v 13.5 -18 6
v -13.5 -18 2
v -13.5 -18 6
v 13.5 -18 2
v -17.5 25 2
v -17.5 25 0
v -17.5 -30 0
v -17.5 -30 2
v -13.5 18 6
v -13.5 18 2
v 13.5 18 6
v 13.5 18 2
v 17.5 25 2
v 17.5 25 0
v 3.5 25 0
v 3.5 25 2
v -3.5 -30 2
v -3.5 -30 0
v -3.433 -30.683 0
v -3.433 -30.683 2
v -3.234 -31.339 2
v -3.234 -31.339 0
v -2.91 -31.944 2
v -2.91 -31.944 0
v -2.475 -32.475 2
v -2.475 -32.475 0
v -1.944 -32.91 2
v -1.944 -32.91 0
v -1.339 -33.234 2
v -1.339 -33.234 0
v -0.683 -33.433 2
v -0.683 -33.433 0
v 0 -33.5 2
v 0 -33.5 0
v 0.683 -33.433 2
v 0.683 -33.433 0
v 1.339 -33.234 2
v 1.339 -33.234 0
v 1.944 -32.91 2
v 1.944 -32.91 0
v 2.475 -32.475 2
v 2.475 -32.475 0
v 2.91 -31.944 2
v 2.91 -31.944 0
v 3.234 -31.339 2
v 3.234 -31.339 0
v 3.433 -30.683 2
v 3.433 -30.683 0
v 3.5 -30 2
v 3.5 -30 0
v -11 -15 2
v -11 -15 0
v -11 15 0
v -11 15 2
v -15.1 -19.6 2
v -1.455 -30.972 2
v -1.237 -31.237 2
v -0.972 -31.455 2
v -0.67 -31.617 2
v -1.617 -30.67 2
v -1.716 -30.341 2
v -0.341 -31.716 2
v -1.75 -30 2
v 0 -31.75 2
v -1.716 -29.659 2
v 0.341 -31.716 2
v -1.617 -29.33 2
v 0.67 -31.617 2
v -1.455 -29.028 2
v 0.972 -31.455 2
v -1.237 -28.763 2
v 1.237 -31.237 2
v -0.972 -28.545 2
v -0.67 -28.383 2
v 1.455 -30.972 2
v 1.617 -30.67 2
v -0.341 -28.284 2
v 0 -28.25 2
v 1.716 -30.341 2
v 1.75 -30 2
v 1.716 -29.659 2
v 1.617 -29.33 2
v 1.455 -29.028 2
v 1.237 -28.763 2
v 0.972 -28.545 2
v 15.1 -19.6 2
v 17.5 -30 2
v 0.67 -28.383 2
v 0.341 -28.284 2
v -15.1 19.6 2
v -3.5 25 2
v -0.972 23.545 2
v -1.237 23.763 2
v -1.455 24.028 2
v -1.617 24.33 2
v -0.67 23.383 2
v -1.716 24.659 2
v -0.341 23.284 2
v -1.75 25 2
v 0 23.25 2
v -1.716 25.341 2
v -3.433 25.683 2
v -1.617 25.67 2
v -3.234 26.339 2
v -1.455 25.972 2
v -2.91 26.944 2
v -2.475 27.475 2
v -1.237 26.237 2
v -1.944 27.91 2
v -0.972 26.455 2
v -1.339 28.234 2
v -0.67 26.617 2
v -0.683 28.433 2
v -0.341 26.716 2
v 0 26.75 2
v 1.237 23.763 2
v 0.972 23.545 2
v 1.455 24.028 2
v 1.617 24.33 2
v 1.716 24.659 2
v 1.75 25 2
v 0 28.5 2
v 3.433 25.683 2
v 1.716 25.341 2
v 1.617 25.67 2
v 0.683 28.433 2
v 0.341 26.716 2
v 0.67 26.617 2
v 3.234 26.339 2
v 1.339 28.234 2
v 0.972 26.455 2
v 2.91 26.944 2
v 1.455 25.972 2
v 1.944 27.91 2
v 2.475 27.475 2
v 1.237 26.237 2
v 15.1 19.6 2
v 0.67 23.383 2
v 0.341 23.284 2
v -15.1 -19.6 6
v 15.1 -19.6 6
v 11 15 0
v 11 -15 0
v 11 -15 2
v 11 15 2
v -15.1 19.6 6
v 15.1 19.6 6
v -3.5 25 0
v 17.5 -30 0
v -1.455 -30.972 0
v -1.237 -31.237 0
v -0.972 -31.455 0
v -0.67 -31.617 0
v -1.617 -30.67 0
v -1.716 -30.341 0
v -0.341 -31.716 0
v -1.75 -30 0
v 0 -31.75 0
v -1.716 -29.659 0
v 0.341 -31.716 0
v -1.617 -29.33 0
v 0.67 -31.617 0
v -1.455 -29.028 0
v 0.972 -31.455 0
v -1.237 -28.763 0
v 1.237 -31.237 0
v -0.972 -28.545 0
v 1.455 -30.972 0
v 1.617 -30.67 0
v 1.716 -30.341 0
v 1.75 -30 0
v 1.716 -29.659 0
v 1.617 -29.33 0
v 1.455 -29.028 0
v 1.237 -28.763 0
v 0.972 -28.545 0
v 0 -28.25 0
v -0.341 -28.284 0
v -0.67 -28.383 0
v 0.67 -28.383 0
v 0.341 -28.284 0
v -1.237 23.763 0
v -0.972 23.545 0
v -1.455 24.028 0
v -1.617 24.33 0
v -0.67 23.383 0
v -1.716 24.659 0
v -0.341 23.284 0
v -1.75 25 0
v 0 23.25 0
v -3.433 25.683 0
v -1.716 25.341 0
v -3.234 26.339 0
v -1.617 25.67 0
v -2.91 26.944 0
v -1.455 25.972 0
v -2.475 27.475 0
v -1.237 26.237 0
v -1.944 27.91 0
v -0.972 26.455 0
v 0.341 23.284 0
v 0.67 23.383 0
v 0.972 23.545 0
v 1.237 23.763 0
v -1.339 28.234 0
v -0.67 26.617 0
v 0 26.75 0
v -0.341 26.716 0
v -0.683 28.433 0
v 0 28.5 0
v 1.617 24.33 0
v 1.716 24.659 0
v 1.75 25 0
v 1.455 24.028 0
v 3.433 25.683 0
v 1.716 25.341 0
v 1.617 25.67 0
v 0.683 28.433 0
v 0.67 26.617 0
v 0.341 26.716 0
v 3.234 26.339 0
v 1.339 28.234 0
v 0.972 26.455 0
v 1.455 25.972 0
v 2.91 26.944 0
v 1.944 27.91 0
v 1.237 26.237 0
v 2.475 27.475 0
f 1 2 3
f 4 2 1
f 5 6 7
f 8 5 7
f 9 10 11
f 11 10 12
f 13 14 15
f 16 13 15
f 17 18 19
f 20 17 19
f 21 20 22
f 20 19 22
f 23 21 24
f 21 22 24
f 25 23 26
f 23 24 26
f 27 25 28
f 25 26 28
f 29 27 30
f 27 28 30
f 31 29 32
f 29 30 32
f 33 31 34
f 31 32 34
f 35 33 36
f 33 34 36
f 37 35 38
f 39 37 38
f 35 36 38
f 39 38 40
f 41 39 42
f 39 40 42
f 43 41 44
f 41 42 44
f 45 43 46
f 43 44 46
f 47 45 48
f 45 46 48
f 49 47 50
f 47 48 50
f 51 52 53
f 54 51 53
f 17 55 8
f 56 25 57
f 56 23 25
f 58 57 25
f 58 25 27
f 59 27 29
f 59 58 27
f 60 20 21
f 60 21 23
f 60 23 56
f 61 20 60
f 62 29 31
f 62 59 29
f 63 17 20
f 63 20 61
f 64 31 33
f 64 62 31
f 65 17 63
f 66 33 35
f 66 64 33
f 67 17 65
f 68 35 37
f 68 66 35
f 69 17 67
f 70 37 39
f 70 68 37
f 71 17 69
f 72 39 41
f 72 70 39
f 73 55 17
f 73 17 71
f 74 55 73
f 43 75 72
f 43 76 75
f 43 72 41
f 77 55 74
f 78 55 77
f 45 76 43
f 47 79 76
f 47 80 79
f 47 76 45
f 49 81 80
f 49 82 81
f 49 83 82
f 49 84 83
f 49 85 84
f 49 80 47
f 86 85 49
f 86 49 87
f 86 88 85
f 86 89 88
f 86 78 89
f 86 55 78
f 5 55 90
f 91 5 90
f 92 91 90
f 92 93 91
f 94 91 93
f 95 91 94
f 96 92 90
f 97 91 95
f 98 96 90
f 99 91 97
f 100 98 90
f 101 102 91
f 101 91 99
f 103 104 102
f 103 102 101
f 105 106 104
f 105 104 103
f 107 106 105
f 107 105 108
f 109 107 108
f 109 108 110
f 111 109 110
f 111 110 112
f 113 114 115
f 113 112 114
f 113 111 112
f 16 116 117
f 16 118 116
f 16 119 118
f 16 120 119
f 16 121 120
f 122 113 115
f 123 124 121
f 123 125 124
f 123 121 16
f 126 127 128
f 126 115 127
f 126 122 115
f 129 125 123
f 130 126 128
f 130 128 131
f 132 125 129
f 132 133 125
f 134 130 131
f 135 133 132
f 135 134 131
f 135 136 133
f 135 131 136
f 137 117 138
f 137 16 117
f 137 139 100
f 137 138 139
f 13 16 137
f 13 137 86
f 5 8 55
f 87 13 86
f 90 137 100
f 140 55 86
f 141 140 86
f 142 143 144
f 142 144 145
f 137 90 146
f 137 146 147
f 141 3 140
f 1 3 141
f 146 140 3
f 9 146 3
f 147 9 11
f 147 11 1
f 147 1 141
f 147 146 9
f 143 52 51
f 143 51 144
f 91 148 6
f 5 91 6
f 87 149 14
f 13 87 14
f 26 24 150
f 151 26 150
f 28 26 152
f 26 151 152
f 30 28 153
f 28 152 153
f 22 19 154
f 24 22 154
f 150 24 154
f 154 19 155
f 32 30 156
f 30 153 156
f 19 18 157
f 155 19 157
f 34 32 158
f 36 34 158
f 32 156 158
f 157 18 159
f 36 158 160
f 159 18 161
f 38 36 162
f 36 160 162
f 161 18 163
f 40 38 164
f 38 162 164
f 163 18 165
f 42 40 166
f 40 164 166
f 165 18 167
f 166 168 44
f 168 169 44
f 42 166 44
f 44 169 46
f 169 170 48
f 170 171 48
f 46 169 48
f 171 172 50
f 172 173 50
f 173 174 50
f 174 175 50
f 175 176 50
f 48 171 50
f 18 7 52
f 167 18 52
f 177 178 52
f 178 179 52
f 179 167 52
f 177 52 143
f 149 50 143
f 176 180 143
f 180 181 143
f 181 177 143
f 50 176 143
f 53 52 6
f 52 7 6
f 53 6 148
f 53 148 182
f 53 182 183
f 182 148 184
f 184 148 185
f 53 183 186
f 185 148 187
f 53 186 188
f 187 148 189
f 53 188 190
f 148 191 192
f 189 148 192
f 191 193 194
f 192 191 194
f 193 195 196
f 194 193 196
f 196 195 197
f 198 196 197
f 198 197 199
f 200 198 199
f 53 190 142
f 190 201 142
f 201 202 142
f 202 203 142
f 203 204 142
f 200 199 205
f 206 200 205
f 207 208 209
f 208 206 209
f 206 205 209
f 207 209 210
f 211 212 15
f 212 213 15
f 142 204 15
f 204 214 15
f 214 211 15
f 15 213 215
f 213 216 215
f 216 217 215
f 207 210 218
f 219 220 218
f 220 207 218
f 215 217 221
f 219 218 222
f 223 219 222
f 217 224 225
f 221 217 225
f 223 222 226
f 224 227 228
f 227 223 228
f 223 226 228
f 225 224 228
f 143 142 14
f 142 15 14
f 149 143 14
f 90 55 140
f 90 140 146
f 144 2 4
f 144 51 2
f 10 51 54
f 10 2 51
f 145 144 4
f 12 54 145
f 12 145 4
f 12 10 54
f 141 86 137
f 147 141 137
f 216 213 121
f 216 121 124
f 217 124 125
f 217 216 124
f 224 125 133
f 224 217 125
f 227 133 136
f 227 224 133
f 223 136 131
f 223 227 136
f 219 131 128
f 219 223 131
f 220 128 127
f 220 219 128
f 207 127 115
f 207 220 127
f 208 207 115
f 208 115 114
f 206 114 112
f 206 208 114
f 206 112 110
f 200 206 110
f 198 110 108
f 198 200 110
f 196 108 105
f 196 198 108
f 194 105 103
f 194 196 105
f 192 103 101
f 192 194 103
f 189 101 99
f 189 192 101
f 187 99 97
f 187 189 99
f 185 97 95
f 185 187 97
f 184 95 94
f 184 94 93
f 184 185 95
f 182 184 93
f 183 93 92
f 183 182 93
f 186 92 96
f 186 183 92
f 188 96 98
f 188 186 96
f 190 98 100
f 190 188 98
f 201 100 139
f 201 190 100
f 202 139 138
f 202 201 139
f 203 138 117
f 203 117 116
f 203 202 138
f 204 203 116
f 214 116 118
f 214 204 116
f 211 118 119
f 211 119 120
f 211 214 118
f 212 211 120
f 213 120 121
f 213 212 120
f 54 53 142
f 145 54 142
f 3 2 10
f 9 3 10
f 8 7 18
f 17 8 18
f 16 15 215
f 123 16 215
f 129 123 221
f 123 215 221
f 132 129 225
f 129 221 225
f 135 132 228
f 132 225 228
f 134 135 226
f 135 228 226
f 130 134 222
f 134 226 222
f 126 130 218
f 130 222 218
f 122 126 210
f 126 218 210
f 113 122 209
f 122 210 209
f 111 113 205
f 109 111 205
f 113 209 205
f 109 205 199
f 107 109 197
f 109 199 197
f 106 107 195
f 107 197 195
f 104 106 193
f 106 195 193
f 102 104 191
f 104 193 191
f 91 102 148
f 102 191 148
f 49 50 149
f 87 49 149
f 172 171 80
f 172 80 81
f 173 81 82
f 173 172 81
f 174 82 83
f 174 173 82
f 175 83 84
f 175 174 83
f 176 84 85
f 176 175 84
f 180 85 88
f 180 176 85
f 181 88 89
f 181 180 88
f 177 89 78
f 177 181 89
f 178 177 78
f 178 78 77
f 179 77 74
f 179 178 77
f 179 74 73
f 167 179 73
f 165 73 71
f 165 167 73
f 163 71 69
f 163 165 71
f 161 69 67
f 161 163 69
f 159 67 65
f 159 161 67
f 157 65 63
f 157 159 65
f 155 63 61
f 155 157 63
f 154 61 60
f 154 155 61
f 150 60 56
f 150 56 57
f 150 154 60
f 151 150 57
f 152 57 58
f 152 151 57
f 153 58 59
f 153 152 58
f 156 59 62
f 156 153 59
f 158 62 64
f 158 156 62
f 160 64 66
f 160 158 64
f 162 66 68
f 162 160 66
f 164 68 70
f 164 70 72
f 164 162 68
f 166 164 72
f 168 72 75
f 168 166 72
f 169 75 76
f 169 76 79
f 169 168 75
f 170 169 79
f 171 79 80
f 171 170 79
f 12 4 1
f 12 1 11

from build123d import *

# Parameters (mm, degrees)
SKETCH_R      = 1.75
SKETCH_W      = 22
SKETCH_H      = 30
PAD_DEPTH     = 2
SKETCH001_W   = 30.2
SKETCH001_H   = 39.2
SKETCH001_W_2 = 27
SKETCH001_H_2 = 36
PAD001_DEPTH  = 6


with BuildPart() as part:
    # Sketch → Pad (new body)
    with BuildSketch(Plane.XY):
        with BuildLine():
            ThreePointArc((3.5, 25), (0, 28.5), (-3.5, 25))
            Line((-3.5, 25), (-17.5, 25))
            Line((-17.5, 25), (-17.5, -30))
            Line((-17.5, -30), (-3.5, -30))
            ThreePointArc((-3.5, -30), (0, -33.5), (3.5, -30))
            Line((3.5, -30), (17.5, -30))
            Line((17.5, -30), (17.5, 25))
            Line((17.5, 25), (3.5, 25))
        make_face()
        with Locations((0, 25)):
            Circle(SKETCH_R, mode=Mode.SUBTRACT)
        with Locations((0, -30)):
            Circle(SKETCH_R, mode=Mode.SUBTRACT)
        Rectangle(SKETCH_W, SKETCH_H, mode=Mode.SUBTRACT)
    extrude(amount=PAD_DEPTH)

    # Sketch001 → Pad001 (join)
    with BuildSketch(Plane.XY):
        Rectangle(SKETCH001_W, SKETCH001_H)
        Rectangle(SKETCH001_W_2, SKETCH001_H_2, mode=Mode.SUBTRACT)
    extrude(amount=PAD001_DEPTH)


solid = part.part
